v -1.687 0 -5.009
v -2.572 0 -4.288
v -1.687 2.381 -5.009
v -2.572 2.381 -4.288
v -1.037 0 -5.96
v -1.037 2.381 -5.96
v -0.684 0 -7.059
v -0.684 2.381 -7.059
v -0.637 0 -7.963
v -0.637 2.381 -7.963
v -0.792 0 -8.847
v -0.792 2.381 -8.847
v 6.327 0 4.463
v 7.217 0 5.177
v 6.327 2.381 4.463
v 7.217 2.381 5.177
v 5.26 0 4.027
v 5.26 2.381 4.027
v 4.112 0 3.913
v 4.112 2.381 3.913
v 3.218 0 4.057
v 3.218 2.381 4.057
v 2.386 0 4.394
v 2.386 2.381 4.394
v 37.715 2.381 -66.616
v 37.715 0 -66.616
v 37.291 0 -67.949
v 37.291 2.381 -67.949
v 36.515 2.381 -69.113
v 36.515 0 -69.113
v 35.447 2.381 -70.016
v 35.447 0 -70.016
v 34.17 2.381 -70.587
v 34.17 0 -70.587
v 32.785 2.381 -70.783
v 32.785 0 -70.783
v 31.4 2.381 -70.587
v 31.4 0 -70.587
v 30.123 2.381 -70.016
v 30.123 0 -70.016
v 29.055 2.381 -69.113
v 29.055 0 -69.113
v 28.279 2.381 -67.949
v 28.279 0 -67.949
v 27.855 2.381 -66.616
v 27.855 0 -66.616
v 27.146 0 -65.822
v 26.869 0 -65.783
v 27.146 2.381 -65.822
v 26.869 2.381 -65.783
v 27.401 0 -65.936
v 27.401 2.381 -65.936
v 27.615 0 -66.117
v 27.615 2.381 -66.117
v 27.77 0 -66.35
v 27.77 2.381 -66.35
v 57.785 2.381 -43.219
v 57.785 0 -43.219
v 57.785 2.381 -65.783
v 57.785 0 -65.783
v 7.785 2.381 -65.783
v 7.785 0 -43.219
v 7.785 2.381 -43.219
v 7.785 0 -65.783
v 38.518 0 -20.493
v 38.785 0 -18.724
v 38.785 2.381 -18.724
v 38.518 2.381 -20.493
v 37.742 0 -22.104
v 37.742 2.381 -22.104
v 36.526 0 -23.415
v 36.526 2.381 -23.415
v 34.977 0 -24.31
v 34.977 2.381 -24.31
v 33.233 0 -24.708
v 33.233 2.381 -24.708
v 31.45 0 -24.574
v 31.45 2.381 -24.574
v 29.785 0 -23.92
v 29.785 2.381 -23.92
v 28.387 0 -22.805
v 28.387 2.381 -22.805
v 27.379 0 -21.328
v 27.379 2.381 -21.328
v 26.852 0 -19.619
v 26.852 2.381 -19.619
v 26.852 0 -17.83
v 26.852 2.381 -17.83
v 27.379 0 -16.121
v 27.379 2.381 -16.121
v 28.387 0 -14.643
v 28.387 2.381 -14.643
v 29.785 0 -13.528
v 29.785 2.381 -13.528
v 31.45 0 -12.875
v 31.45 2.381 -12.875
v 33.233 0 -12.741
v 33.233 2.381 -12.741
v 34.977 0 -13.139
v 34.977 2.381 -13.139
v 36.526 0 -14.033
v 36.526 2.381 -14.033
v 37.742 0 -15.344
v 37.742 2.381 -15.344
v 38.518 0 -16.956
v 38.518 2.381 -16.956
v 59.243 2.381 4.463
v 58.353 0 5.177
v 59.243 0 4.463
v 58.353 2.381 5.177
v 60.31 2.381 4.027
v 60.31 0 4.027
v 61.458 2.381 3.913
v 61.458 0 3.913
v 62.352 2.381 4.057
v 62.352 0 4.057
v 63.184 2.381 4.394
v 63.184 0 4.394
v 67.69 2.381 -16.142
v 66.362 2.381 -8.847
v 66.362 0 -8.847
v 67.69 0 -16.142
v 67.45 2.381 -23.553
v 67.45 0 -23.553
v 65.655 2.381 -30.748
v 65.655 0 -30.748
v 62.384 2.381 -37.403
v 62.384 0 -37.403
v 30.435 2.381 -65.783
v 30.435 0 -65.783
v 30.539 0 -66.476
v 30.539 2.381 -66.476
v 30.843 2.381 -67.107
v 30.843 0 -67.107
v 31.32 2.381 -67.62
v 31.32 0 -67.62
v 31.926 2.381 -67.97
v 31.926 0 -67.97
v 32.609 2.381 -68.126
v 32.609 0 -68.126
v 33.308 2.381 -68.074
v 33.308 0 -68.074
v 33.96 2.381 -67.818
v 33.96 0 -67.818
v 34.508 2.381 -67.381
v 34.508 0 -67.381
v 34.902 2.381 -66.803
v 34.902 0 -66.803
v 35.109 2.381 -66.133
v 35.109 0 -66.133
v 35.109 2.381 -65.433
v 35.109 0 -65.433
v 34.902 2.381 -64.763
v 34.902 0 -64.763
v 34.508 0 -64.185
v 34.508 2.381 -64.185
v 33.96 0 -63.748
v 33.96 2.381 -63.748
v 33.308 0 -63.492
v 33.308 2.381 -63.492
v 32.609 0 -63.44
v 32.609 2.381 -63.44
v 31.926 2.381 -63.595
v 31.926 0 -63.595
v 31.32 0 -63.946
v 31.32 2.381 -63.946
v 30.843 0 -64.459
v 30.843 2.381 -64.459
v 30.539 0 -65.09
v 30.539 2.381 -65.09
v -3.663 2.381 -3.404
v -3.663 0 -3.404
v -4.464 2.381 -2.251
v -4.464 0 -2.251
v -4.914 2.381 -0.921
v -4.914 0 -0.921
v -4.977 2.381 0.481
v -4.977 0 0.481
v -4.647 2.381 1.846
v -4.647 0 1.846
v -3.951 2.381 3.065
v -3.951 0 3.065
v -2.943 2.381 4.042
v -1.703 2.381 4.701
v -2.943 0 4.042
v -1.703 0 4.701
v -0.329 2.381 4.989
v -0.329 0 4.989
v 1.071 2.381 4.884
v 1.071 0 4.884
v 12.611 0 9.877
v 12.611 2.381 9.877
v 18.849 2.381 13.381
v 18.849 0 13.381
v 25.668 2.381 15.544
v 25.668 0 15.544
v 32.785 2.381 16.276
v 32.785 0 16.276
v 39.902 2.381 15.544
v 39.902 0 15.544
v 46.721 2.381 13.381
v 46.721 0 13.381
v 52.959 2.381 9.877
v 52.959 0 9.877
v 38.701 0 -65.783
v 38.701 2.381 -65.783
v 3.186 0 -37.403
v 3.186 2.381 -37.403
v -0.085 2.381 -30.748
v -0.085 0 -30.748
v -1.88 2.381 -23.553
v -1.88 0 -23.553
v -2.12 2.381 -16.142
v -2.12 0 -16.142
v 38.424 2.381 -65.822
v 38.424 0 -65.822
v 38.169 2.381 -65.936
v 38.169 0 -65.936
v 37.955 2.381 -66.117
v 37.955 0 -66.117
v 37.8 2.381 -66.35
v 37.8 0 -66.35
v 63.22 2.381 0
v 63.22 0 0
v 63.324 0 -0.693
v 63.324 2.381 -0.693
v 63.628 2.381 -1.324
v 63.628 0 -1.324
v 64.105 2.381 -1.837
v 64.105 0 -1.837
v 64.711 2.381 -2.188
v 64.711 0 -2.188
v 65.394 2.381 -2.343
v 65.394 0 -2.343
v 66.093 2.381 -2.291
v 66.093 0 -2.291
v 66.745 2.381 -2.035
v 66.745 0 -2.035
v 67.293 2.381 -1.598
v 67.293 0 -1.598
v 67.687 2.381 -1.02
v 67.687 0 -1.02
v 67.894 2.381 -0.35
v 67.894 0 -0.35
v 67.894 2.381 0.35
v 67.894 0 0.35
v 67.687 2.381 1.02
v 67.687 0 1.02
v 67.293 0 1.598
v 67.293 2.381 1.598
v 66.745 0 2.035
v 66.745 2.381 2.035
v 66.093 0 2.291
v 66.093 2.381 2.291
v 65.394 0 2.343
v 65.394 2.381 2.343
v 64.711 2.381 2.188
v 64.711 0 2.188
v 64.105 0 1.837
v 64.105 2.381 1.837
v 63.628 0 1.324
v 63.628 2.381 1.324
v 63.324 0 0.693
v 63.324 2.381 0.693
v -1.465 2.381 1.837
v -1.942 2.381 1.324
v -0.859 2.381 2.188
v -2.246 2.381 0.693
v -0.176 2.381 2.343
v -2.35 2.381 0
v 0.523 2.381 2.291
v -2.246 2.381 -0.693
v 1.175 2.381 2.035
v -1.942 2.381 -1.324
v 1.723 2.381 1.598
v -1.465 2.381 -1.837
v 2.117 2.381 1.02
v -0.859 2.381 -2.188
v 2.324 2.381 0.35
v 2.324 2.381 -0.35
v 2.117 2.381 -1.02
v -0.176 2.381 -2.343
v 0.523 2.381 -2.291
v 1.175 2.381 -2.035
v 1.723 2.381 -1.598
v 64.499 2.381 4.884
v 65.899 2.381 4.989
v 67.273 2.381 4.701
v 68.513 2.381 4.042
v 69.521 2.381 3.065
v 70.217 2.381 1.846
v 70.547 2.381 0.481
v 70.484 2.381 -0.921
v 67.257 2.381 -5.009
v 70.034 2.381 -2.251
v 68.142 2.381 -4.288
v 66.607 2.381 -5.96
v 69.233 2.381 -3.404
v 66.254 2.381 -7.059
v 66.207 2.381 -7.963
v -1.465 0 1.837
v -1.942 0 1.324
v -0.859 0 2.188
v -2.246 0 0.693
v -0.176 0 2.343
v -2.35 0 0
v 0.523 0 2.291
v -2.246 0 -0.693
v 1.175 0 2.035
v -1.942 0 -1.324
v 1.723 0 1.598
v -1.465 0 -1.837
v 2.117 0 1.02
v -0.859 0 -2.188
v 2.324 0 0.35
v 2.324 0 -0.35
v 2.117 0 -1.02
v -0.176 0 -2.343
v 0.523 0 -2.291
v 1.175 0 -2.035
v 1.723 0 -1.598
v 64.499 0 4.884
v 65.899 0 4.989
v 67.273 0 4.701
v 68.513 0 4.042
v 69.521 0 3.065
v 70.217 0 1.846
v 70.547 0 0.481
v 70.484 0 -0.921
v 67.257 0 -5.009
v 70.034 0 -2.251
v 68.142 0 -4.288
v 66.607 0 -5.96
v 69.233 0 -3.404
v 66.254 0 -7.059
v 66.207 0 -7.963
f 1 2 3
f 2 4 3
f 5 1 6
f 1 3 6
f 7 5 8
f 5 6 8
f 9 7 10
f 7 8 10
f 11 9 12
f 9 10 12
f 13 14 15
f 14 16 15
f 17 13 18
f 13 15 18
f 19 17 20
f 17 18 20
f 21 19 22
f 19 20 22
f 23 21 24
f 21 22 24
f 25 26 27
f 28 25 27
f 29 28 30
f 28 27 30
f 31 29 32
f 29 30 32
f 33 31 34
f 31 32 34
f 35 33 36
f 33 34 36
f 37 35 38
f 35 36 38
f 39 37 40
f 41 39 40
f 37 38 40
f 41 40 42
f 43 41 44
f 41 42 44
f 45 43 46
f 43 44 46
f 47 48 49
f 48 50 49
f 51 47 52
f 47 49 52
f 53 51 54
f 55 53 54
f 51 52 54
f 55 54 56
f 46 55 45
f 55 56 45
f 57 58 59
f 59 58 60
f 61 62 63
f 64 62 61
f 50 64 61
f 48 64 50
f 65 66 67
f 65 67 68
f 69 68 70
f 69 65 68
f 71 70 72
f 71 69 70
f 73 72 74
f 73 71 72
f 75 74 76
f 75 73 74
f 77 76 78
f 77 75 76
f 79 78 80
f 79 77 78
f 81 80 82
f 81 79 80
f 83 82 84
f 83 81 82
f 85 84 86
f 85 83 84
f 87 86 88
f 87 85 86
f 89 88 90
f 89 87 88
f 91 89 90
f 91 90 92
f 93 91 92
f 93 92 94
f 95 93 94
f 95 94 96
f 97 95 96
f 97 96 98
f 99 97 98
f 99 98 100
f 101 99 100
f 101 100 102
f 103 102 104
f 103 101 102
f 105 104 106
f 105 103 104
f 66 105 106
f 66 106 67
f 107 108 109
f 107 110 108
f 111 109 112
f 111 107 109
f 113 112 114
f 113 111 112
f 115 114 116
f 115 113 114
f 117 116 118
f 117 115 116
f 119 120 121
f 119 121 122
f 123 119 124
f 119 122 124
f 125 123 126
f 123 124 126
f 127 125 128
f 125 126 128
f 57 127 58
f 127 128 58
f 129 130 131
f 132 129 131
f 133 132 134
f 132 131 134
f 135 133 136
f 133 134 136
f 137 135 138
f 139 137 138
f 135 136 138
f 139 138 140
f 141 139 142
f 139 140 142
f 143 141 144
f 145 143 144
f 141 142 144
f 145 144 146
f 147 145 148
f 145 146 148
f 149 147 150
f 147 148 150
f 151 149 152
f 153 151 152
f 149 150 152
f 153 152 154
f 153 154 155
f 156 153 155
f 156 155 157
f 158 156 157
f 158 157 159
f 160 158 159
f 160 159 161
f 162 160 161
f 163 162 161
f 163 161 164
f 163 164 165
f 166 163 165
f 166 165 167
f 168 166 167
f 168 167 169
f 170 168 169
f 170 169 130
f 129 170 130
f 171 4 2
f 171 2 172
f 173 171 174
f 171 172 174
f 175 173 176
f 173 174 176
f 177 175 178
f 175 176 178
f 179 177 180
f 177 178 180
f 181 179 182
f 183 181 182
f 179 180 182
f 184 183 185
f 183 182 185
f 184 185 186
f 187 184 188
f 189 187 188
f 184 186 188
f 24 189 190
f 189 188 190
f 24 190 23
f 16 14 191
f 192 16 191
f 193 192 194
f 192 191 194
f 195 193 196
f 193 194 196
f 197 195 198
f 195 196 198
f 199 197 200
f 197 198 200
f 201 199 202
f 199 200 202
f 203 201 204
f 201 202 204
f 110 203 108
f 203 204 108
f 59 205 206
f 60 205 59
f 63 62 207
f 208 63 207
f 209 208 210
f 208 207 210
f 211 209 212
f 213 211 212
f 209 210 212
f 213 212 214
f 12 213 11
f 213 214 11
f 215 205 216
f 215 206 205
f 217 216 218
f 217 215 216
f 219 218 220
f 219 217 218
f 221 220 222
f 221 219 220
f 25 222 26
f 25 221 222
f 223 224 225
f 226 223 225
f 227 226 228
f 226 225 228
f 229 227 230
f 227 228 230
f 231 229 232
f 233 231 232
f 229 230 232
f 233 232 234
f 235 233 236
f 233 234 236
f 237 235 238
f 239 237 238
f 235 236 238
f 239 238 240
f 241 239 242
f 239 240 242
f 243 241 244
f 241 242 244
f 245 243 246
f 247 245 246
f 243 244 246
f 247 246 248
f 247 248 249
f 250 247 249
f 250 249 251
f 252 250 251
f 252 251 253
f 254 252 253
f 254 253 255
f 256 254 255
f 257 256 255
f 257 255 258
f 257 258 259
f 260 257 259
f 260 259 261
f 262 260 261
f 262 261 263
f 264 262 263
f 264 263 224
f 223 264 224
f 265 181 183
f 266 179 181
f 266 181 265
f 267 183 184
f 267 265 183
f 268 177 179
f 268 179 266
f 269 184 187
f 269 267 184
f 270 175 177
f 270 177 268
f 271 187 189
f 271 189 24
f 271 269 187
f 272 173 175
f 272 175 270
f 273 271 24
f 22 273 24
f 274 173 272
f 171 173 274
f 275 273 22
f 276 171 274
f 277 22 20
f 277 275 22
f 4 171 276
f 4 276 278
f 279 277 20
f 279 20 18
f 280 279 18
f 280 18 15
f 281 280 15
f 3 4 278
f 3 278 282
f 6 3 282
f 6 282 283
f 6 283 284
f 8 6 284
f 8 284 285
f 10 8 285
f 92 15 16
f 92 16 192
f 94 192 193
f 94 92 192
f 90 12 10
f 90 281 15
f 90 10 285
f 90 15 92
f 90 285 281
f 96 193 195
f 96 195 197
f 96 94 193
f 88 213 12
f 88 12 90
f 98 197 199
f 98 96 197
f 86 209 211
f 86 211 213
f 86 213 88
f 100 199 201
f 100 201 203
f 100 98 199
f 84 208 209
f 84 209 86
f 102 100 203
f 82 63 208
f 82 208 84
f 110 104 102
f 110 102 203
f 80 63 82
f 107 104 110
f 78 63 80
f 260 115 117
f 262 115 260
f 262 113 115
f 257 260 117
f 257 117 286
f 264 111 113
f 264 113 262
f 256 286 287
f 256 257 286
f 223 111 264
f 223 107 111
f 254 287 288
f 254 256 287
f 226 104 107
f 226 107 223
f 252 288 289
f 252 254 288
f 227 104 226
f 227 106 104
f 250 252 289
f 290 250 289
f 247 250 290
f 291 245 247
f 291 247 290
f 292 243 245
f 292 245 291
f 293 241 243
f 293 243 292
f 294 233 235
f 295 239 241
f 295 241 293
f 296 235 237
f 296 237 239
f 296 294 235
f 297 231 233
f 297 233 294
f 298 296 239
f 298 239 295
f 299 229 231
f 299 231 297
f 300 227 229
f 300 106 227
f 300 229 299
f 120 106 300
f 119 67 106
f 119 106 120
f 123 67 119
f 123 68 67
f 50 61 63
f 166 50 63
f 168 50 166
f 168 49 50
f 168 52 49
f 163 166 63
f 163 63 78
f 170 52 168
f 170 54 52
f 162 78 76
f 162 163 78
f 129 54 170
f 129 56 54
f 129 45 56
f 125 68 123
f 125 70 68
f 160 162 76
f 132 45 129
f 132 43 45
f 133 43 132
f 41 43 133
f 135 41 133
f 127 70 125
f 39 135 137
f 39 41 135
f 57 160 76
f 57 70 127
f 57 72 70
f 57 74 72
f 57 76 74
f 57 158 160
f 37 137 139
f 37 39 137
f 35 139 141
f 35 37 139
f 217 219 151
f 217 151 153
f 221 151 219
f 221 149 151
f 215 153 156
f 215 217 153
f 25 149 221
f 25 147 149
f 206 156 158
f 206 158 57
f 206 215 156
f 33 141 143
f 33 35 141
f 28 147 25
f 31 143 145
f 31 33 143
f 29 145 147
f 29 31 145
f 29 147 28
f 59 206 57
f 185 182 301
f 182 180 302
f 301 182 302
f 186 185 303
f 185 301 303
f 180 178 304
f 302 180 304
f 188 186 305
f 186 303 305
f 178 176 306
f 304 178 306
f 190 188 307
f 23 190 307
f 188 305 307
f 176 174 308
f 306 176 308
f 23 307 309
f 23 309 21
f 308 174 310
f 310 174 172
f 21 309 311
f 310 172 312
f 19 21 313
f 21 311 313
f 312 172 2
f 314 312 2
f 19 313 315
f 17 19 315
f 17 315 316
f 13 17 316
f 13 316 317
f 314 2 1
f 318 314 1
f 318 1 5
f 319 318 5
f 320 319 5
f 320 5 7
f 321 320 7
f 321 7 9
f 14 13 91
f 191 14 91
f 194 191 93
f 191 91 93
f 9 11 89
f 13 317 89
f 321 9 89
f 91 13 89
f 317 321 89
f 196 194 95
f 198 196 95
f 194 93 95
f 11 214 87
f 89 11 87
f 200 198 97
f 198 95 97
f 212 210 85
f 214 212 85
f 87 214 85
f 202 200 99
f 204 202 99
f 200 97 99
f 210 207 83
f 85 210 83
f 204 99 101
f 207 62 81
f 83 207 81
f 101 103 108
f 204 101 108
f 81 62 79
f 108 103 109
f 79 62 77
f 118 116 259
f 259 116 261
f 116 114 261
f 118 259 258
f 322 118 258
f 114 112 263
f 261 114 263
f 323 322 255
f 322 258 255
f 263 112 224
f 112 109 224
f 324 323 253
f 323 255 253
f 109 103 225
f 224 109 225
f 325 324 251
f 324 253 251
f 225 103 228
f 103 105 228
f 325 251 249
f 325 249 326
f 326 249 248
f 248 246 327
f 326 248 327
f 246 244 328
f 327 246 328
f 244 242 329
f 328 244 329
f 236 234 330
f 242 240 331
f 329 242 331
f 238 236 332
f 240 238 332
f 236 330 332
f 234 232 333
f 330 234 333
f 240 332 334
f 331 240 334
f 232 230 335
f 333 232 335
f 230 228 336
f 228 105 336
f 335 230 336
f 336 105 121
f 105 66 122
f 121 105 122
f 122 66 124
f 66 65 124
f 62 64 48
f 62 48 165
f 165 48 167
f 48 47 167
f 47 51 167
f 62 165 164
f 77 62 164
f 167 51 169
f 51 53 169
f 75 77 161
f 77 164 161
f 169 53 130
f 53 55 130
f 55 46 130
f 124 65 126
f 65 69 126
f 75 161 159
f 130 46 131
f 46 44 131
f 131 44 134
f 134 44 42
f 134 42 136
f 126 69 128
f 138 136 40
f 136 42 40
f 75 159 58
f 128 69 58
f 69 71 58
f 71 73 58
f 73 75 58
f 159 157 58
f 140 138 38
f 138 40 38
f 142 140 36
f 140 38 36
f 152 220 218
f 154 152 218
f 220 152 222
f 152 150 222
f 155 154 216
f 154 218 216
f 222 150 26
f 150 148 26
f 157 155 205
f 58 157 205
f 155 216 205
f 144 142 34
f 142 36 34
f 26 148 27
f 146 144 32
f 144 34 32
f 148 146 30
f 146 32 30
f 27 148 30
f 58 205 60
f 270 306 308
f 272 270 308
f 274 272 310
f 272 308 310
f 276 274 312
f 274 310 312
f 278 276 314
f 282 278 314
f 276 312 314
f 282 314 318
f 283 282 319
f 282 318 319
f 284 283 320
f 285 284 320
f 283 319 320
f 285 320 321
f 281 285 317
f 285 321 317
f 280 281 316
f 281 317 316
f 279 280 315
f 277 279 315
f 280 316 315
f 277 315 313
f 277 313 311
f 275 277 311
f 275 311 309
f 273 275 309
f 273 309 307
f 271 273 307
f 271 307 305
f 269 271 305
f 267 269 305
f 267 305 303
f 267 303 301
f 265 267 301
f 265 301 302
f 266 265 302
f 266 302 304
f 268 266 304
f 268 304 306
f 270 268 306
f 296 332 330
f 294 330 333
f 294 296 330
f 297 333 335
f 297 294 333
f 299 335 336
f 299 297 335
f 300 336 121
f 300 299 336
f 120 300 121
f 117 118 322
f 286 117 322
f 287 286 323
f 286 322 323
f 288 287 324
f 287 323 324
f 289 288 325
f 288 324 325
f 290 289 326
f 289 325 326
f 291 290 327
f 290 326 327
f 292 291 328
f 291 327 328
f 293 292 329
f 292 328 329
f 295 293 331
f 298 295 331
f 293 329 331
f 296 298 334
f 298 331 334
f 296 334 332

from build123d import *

# Parameters (mm, degrees)
SKETCH1_R                  = 35
SKETCH1_R_2                = 6
SKETCH1_R_3                = 5
SKETCH1_W                  = 50
SKETCH1_H                  = 25
BOSS_EXTRUDE1_DEPTH        = 2.38125
FILLET1_R                  = 4
FILLET2_R                  = 4
FILLET3_R                  = 1
F_4_7_4_7_DIAMETER_HOLE1_D = 4.7


with BuildPart() as part:
    # Sketch1 → Boss-Extrude1 (new body)
    with BuildSketch(Plane(origin=(0, 0, 0), x_dir=(1, 0, 0), z_dir=(0, 1, 0))):
        with Locations((32.785, 18.724314586)):
            Circle(SKETCH1_R)
        with Locations((32.785, 18.724314586)):
            Circle(SKETCH1_R_2, mode=Mode.SUBTRACT)
        with Locations((65.57, 0)):
            Circle(SKETCH1_R_3)
        Circle(SKETCH1_R_3)
        with Locations((32.785, 65.782929207)):
            Circle(SKETCH1_R_3)
        with Locations((32.785, 53.282929207)):
            Rectangle(SKETCH1_W, SKETCH1_H)
    extrude(amount=BOSS_EXTRUDE1_DEPTH)

    # Fillet1
    fillet1_edges = [part.edges().sort_by_distance(p)[0] for p in [
        (64.966328407, 1.190625, -4.963424282),
        (60.988257258, 1.190625, 2.001907453),
    ]]
    fillet(fillet1_edges, radius=FILLET1_R)

    # Fillet2
    fillet2_edges = [part.edges().sort_by_distance(p)[0] for p in [
        (0.603671593, 1.190625, -4.963424282),
        (4.581742742, 1.190625, 2.001907453),
    ]]
    fillet(fillet2_edges, radius=FILLET2_R)

    # Fillet3
    fillet3_edges = [part.edges().sort_by_distance(p)[0] for p in [
        (37.785, 1.190625, -65.782929207),
        (27.785, 1.190625, -65.782929207),
    ]]
    fillet(fillet3_edges, radius=FILLET3_R)

    # Ø4.7 (4.7) Diameter Hole1 (through all)
    with Locations(Plane(origin=(0, 2.38125, 0), x_dir=(1, 0, 0), z_dir=(0, 1, 0))):
        with Locations((32.785, 65.782929207), (0, 0), (65.57, 0)):
            Hole(F_4_7_4_7_DIAMETER_HOLE1_D / 2)


solid = part.part
